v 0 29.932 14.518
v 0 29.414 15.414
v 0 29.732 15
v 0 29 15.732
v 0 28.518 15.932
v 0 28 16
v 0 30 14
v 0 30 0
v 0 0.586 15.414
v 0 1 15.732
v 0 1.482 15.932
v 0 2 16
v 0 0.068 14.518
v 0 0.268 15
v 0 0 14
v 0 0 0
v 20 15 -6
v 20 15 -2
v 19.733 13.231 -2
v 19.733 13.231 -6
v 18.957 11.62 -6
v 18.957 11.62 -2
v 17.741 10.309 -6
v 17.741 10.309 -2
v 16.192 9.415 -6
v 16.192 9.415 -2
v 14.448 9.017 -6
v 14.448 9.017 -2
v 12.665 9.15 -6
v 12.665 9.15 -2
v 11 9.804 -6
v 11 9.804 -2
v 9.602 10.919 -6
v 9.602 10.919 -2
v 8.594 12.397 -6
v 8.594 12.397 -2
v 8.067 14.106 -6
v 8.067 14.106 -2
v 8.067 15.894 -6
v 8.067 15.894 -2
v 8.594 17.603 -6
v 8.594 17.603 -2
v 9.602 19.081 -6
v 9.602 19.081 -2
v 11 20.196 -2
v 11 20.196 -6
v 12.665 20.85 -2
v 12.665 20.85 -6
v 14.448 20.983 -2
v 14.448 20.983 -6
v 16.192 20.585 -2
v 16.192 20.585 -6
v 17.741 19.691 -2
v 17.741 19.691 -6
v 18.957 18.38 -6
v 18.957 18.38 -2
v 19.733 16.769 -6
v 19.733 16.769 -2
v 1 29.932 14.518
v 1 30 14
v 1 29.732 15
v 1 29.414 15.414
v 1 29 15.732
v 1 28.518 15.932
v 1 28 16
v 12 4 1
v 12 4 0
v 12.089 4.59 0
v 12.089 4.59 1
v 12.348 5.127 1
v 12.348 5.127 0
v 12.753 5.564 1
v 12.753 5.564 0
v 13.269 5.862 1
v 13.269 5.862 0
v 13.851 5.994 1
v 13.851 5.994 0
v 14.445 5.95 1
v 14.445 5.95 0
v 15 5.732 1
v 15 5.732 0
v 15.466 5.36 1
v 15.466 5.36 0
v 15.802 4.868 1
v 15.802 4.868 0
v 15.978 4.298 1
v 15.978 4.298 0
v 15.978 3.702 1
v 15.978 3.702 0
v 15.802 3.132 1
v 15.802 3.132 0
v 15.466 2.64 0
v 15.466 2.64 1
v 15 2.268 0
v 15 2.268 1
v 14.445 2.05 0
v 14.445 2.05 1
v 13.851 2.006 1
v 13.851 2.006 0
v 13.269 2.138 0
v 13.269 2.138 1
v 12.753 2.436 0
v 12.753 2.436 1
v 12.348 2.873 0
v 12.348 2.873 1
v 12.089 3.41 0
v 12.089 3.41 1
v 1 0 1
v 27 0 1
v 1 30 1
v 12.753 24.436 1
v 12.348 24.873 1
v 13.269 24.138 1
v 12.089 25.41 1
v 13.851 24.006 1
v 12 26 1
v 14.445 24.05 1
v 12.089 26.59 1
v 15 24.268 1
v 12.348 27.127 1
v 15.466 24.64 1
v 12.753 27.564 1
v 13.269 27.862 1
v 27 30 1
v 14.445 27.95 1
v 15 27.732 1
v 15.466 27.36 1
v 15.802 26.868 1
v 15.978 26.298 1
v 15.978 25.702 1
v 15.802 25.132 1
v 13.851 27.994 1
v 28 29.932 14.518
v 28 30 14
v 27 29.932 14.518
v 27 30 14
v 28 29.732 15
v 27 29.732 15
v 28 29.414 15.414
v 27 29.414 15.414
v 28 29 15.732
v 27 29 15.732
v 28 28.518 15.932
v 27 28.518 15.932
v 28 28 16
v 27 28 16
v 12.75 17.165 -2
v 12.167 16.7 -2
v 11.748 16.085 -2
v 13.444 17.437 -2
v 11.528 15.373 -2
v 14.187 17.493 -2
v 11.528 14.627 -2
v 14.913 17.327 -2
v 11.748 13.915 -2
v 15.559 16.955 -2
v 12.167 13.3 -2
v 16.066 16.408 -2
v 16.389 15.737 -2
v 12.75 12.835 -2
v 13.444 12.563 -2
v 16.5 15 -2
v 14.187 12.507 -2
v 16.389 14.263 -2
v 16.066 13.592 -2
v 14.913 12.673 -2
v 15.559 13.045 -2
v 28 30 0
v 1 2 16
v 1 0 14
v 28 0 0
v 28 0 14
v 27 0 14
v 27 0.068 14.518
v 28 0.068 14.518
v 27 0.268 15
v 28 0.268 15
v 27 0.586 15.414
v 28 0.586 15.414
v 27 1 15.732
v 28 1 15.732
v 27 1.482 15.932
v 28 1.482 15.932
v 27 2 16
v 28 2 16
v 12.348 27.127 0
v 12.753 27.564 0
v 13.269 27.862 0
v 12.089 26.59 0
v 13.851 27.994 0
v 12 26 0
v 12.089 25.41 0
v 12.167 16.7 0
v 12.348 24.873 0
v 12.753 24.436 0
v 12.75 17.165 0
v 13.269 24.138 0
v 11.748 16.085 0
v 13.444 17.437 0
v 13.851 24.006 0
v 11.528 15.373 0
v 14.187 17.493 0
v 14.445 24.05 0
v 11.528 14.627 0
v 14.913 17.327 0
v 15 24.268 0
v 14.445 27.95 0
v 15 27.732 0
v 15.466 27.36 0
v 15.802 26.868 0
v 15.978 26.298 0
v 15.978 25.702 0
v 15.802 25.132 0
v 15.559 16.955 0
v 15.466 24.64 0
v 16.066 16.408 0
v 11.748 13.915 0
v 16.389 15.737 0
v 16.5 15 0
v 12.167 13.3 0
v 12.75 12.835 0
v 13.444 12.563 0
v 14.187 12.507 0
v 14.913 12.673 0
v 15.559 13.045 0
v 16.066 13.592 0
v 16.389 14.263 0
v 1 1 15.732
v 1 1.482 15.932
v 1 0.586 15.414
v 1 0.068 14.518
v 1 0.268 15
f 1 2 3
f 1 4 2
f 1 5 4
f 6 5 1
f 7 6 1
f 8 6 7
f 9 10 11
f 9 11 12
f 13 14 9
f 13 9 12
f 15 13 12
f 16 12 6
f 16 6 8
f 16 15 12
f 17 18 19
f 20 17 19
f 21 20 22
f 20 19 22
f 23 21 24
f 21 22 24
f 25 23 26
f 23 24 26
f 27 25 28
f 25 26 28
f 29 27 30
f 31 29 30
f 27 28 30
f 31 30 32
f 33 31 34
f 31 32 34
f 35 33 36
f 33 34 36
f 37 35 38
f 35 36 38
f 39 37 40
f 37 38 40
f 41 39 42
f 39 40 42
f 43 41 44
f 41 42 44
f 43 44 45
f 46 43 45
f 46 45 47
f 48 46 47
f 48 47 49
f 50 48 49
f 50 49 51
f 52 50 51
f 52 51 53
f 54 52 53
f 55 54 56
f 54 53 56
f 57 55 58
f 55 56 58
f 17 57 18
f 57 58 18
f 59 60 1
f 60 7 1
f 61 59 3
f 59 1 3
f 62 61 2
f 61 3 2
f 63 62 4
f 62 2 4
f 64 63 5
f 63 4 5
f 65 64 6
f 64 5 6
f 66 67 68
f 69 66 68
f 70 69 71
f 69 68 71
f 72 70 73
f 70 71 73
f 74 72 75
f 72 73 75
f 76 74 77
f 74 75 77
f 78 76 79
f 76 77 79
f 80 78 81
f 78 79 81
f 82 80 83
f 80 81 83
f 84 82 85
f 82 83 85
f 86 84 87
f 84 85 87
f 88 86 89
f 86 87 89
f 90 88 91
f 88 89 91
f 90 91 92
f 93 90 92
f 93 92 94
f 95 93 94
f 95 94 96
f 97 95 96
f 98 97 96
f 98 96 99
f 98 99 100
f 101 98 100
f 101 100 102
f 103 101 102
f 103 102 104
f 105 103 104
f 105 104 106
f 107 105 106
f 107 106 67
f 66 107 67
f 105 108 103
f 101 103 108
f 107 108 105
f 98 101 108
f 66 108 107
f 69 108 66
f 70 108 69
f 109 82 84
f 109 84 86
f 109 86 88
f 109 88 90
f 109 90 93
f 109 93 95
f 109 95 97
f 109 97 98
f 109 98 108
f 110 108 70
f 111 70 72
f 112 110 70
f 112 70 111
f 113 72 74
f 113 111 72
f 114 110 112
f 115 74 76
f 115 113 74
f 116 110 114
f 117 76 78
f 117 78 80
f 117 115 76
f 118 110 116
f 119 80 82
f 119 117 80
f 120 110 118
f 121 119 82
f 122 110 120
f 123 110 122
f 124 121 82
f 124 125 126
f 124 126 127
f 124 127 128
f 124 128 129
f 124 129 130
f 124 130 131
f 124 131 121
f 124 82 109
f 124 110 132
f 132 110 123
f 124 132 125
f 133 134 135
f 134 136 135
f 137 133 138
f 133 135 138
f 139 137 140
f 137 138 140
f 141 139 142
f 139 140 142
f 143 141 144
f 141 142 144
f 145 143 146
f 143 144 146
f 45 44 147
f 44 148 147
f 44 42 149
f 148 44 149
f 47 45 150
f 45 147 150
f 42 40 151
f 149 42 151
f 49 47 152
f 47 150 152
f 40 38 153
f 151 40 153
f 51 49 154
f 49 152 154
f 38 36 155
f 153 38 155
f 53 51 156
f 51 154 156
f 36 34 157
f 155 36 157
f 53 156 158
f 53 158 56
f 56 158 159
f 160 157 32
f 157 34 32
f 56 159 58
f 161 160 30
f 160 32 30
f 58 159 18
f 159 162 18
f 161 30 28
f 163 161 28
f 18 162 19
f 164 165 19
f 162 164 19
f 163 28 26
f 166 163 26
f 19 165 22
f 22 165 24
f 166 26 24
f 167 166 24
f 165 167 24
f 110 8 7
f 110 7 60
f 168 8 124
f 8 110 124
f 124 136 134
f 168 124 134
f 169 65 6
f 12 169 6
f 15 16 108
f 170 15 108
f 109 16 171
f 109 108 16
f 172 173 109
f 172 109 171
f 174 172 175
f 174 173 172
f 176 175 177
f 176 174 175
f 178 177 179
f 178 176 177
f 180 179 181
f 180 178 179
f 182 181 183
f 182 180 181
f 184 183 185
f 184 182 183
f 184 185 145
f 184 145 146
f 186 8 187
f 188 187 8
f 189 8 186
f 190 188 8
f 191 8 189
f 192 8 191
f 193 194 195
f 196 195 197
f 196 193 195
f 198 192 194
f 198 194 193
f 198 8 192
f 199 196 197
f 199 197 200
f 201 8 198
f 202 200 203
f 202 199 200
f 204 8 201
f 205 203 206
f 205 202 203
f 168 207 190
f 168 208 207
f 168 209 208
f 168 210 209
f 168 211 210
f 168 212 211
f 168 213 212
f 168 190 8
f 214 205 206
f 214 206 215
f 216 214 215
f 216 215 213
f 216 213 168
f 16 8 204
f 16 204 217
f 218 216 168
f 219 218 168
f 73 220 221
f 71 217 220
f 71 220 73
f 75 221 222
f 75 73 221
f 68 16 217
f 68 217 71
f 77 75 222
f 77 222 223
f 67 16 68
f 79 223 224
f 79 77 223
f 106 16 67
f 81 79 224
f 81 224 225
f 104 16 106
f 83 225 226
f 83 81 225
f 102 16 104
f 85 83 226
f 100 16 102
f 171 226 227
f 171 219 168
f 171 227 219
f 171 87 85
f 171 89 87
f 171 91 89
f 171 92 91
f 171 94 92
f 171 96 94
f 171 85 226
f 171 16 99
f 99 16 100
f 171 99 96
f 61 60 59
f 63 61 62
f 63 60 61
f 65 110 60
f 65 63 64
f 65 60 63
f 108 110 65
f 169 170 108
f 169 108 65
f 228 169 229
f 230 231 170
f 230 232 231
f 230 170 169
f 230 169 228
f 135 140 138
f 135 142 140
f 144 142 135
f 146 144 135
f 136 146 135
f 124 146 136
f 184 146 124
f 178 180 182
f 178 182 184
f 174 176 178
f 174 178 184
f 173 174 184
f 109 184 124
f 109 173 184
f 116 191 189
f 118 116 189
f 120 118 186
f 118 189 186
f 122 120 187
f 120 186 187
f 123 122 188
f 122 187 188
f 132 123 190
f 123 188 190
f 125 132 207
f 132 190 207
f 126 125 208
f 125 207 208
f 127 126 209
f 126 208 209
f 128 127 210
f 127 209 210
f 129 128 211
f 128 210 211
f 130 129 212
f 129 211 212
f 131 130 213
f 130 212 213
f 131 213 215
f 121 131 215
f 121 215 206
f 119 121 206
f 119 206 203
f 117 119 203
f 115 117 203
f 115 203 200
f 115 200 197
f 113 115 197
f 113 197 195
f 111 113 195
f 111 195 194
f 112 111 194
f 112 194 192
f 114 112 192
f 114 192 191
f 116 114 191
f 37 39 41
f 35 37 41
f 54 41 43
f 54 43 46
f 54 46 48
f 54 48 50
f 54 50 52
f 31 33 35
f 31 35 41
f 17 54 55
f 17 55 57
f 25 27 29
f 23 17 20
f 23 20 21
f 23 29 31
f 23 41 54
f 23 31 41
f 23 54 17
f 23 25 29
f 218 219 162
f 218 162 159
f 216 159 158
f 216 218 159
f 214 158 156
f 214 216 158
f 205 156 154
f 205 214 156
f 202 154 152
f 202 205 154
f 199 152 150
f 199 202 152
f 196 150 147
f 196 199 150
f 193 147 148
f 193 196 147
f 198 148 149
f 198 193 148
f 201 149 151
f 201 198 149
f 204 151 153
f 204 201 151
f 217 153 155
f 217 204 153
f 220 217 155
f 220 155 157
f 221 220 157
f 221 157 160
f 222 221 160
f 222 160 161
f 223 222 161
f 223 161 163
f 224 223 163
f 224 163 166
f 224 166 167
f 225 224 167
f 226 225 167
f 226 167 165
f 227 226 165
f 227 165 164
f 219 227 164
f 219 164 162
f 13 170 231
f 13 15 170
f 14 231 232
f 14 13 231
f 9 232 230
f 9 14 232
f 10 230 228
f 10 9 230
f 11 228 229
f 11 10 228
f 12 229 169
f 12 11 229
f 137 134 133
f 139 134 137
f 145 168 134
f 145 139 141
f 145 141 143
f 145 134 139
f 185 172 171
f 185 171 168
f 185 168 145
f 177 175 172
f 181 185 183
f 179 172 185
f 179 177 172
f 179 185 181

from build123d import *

# Parameters (mm, degrees)
F1_DEPTH = 30
F2_R     = 2.5
F3_DEPTH = 3
F4_R     = 6
F4_R_2   = 2.5
F5_DEPTH = 4
F6_R     = 2
F7_D     = 4
F7_DEPTH = 15
F7_TIP   = 1.2017212381


with BuildPart() as f1:
    # F0 (on Front) → F1 (new body)
    with BuildSketch(Plane.XZ):
        Polygon((0, 1), (0, 0), (28, 0), (28, 1), (28, 16), (27, 16), (27, 1), (1, 1), (1, 16), (0, 16), align=None)
    extrude(amount=-F1_DEPTH)

    # F2 (on face) → F3 (join)
    with BuildSketch(Plane.XY.offset(1)):
        with Locations((14, 15)):
            Circle(F2_R)
    extrude(amount=-F3_DEPTH)

    # F4 (on face) → F5 (join)
    with BuildSketch(Plane(origin=(0, 0, -2), x_dir=(1, 0, 0), z_dir=(0, 0, -1))):
        with Locations((14, -15)):
            Circle(F4_R)
        with Locations((14, -15)):
            Circle(F4_R_2, mode=Mode.SUBTRACT)
        with Locations((14, -15)):
            Circle(F4_R_2)
    extrude(amount=F5_DEPTH)

    # F6
    f6_edges = [f1.edges().sort_by_distance(p)[0] for p in [
        (27.5, 0, 16),
        (27.5, 30, 16),
        (0.5, 30, 16),
        (0.5, 0, 16),
    ]]
    fillet(f6_edges, radius=F6_R)

    # F7
    with Locations(Plane.XY.offset(1)):
        with Locations((14, 4), (14, 26)):
            Hole(F7_D / 2, depth=F7_DEPTH)
            with Locations((0, 0, -(F7_DEPTH + F7_TIP / 2))):  # 118° drill point
                Cone(0, F7_D / 2, F7_TIP, mode=Mode.SUBTRACT)


solid = f1.part
